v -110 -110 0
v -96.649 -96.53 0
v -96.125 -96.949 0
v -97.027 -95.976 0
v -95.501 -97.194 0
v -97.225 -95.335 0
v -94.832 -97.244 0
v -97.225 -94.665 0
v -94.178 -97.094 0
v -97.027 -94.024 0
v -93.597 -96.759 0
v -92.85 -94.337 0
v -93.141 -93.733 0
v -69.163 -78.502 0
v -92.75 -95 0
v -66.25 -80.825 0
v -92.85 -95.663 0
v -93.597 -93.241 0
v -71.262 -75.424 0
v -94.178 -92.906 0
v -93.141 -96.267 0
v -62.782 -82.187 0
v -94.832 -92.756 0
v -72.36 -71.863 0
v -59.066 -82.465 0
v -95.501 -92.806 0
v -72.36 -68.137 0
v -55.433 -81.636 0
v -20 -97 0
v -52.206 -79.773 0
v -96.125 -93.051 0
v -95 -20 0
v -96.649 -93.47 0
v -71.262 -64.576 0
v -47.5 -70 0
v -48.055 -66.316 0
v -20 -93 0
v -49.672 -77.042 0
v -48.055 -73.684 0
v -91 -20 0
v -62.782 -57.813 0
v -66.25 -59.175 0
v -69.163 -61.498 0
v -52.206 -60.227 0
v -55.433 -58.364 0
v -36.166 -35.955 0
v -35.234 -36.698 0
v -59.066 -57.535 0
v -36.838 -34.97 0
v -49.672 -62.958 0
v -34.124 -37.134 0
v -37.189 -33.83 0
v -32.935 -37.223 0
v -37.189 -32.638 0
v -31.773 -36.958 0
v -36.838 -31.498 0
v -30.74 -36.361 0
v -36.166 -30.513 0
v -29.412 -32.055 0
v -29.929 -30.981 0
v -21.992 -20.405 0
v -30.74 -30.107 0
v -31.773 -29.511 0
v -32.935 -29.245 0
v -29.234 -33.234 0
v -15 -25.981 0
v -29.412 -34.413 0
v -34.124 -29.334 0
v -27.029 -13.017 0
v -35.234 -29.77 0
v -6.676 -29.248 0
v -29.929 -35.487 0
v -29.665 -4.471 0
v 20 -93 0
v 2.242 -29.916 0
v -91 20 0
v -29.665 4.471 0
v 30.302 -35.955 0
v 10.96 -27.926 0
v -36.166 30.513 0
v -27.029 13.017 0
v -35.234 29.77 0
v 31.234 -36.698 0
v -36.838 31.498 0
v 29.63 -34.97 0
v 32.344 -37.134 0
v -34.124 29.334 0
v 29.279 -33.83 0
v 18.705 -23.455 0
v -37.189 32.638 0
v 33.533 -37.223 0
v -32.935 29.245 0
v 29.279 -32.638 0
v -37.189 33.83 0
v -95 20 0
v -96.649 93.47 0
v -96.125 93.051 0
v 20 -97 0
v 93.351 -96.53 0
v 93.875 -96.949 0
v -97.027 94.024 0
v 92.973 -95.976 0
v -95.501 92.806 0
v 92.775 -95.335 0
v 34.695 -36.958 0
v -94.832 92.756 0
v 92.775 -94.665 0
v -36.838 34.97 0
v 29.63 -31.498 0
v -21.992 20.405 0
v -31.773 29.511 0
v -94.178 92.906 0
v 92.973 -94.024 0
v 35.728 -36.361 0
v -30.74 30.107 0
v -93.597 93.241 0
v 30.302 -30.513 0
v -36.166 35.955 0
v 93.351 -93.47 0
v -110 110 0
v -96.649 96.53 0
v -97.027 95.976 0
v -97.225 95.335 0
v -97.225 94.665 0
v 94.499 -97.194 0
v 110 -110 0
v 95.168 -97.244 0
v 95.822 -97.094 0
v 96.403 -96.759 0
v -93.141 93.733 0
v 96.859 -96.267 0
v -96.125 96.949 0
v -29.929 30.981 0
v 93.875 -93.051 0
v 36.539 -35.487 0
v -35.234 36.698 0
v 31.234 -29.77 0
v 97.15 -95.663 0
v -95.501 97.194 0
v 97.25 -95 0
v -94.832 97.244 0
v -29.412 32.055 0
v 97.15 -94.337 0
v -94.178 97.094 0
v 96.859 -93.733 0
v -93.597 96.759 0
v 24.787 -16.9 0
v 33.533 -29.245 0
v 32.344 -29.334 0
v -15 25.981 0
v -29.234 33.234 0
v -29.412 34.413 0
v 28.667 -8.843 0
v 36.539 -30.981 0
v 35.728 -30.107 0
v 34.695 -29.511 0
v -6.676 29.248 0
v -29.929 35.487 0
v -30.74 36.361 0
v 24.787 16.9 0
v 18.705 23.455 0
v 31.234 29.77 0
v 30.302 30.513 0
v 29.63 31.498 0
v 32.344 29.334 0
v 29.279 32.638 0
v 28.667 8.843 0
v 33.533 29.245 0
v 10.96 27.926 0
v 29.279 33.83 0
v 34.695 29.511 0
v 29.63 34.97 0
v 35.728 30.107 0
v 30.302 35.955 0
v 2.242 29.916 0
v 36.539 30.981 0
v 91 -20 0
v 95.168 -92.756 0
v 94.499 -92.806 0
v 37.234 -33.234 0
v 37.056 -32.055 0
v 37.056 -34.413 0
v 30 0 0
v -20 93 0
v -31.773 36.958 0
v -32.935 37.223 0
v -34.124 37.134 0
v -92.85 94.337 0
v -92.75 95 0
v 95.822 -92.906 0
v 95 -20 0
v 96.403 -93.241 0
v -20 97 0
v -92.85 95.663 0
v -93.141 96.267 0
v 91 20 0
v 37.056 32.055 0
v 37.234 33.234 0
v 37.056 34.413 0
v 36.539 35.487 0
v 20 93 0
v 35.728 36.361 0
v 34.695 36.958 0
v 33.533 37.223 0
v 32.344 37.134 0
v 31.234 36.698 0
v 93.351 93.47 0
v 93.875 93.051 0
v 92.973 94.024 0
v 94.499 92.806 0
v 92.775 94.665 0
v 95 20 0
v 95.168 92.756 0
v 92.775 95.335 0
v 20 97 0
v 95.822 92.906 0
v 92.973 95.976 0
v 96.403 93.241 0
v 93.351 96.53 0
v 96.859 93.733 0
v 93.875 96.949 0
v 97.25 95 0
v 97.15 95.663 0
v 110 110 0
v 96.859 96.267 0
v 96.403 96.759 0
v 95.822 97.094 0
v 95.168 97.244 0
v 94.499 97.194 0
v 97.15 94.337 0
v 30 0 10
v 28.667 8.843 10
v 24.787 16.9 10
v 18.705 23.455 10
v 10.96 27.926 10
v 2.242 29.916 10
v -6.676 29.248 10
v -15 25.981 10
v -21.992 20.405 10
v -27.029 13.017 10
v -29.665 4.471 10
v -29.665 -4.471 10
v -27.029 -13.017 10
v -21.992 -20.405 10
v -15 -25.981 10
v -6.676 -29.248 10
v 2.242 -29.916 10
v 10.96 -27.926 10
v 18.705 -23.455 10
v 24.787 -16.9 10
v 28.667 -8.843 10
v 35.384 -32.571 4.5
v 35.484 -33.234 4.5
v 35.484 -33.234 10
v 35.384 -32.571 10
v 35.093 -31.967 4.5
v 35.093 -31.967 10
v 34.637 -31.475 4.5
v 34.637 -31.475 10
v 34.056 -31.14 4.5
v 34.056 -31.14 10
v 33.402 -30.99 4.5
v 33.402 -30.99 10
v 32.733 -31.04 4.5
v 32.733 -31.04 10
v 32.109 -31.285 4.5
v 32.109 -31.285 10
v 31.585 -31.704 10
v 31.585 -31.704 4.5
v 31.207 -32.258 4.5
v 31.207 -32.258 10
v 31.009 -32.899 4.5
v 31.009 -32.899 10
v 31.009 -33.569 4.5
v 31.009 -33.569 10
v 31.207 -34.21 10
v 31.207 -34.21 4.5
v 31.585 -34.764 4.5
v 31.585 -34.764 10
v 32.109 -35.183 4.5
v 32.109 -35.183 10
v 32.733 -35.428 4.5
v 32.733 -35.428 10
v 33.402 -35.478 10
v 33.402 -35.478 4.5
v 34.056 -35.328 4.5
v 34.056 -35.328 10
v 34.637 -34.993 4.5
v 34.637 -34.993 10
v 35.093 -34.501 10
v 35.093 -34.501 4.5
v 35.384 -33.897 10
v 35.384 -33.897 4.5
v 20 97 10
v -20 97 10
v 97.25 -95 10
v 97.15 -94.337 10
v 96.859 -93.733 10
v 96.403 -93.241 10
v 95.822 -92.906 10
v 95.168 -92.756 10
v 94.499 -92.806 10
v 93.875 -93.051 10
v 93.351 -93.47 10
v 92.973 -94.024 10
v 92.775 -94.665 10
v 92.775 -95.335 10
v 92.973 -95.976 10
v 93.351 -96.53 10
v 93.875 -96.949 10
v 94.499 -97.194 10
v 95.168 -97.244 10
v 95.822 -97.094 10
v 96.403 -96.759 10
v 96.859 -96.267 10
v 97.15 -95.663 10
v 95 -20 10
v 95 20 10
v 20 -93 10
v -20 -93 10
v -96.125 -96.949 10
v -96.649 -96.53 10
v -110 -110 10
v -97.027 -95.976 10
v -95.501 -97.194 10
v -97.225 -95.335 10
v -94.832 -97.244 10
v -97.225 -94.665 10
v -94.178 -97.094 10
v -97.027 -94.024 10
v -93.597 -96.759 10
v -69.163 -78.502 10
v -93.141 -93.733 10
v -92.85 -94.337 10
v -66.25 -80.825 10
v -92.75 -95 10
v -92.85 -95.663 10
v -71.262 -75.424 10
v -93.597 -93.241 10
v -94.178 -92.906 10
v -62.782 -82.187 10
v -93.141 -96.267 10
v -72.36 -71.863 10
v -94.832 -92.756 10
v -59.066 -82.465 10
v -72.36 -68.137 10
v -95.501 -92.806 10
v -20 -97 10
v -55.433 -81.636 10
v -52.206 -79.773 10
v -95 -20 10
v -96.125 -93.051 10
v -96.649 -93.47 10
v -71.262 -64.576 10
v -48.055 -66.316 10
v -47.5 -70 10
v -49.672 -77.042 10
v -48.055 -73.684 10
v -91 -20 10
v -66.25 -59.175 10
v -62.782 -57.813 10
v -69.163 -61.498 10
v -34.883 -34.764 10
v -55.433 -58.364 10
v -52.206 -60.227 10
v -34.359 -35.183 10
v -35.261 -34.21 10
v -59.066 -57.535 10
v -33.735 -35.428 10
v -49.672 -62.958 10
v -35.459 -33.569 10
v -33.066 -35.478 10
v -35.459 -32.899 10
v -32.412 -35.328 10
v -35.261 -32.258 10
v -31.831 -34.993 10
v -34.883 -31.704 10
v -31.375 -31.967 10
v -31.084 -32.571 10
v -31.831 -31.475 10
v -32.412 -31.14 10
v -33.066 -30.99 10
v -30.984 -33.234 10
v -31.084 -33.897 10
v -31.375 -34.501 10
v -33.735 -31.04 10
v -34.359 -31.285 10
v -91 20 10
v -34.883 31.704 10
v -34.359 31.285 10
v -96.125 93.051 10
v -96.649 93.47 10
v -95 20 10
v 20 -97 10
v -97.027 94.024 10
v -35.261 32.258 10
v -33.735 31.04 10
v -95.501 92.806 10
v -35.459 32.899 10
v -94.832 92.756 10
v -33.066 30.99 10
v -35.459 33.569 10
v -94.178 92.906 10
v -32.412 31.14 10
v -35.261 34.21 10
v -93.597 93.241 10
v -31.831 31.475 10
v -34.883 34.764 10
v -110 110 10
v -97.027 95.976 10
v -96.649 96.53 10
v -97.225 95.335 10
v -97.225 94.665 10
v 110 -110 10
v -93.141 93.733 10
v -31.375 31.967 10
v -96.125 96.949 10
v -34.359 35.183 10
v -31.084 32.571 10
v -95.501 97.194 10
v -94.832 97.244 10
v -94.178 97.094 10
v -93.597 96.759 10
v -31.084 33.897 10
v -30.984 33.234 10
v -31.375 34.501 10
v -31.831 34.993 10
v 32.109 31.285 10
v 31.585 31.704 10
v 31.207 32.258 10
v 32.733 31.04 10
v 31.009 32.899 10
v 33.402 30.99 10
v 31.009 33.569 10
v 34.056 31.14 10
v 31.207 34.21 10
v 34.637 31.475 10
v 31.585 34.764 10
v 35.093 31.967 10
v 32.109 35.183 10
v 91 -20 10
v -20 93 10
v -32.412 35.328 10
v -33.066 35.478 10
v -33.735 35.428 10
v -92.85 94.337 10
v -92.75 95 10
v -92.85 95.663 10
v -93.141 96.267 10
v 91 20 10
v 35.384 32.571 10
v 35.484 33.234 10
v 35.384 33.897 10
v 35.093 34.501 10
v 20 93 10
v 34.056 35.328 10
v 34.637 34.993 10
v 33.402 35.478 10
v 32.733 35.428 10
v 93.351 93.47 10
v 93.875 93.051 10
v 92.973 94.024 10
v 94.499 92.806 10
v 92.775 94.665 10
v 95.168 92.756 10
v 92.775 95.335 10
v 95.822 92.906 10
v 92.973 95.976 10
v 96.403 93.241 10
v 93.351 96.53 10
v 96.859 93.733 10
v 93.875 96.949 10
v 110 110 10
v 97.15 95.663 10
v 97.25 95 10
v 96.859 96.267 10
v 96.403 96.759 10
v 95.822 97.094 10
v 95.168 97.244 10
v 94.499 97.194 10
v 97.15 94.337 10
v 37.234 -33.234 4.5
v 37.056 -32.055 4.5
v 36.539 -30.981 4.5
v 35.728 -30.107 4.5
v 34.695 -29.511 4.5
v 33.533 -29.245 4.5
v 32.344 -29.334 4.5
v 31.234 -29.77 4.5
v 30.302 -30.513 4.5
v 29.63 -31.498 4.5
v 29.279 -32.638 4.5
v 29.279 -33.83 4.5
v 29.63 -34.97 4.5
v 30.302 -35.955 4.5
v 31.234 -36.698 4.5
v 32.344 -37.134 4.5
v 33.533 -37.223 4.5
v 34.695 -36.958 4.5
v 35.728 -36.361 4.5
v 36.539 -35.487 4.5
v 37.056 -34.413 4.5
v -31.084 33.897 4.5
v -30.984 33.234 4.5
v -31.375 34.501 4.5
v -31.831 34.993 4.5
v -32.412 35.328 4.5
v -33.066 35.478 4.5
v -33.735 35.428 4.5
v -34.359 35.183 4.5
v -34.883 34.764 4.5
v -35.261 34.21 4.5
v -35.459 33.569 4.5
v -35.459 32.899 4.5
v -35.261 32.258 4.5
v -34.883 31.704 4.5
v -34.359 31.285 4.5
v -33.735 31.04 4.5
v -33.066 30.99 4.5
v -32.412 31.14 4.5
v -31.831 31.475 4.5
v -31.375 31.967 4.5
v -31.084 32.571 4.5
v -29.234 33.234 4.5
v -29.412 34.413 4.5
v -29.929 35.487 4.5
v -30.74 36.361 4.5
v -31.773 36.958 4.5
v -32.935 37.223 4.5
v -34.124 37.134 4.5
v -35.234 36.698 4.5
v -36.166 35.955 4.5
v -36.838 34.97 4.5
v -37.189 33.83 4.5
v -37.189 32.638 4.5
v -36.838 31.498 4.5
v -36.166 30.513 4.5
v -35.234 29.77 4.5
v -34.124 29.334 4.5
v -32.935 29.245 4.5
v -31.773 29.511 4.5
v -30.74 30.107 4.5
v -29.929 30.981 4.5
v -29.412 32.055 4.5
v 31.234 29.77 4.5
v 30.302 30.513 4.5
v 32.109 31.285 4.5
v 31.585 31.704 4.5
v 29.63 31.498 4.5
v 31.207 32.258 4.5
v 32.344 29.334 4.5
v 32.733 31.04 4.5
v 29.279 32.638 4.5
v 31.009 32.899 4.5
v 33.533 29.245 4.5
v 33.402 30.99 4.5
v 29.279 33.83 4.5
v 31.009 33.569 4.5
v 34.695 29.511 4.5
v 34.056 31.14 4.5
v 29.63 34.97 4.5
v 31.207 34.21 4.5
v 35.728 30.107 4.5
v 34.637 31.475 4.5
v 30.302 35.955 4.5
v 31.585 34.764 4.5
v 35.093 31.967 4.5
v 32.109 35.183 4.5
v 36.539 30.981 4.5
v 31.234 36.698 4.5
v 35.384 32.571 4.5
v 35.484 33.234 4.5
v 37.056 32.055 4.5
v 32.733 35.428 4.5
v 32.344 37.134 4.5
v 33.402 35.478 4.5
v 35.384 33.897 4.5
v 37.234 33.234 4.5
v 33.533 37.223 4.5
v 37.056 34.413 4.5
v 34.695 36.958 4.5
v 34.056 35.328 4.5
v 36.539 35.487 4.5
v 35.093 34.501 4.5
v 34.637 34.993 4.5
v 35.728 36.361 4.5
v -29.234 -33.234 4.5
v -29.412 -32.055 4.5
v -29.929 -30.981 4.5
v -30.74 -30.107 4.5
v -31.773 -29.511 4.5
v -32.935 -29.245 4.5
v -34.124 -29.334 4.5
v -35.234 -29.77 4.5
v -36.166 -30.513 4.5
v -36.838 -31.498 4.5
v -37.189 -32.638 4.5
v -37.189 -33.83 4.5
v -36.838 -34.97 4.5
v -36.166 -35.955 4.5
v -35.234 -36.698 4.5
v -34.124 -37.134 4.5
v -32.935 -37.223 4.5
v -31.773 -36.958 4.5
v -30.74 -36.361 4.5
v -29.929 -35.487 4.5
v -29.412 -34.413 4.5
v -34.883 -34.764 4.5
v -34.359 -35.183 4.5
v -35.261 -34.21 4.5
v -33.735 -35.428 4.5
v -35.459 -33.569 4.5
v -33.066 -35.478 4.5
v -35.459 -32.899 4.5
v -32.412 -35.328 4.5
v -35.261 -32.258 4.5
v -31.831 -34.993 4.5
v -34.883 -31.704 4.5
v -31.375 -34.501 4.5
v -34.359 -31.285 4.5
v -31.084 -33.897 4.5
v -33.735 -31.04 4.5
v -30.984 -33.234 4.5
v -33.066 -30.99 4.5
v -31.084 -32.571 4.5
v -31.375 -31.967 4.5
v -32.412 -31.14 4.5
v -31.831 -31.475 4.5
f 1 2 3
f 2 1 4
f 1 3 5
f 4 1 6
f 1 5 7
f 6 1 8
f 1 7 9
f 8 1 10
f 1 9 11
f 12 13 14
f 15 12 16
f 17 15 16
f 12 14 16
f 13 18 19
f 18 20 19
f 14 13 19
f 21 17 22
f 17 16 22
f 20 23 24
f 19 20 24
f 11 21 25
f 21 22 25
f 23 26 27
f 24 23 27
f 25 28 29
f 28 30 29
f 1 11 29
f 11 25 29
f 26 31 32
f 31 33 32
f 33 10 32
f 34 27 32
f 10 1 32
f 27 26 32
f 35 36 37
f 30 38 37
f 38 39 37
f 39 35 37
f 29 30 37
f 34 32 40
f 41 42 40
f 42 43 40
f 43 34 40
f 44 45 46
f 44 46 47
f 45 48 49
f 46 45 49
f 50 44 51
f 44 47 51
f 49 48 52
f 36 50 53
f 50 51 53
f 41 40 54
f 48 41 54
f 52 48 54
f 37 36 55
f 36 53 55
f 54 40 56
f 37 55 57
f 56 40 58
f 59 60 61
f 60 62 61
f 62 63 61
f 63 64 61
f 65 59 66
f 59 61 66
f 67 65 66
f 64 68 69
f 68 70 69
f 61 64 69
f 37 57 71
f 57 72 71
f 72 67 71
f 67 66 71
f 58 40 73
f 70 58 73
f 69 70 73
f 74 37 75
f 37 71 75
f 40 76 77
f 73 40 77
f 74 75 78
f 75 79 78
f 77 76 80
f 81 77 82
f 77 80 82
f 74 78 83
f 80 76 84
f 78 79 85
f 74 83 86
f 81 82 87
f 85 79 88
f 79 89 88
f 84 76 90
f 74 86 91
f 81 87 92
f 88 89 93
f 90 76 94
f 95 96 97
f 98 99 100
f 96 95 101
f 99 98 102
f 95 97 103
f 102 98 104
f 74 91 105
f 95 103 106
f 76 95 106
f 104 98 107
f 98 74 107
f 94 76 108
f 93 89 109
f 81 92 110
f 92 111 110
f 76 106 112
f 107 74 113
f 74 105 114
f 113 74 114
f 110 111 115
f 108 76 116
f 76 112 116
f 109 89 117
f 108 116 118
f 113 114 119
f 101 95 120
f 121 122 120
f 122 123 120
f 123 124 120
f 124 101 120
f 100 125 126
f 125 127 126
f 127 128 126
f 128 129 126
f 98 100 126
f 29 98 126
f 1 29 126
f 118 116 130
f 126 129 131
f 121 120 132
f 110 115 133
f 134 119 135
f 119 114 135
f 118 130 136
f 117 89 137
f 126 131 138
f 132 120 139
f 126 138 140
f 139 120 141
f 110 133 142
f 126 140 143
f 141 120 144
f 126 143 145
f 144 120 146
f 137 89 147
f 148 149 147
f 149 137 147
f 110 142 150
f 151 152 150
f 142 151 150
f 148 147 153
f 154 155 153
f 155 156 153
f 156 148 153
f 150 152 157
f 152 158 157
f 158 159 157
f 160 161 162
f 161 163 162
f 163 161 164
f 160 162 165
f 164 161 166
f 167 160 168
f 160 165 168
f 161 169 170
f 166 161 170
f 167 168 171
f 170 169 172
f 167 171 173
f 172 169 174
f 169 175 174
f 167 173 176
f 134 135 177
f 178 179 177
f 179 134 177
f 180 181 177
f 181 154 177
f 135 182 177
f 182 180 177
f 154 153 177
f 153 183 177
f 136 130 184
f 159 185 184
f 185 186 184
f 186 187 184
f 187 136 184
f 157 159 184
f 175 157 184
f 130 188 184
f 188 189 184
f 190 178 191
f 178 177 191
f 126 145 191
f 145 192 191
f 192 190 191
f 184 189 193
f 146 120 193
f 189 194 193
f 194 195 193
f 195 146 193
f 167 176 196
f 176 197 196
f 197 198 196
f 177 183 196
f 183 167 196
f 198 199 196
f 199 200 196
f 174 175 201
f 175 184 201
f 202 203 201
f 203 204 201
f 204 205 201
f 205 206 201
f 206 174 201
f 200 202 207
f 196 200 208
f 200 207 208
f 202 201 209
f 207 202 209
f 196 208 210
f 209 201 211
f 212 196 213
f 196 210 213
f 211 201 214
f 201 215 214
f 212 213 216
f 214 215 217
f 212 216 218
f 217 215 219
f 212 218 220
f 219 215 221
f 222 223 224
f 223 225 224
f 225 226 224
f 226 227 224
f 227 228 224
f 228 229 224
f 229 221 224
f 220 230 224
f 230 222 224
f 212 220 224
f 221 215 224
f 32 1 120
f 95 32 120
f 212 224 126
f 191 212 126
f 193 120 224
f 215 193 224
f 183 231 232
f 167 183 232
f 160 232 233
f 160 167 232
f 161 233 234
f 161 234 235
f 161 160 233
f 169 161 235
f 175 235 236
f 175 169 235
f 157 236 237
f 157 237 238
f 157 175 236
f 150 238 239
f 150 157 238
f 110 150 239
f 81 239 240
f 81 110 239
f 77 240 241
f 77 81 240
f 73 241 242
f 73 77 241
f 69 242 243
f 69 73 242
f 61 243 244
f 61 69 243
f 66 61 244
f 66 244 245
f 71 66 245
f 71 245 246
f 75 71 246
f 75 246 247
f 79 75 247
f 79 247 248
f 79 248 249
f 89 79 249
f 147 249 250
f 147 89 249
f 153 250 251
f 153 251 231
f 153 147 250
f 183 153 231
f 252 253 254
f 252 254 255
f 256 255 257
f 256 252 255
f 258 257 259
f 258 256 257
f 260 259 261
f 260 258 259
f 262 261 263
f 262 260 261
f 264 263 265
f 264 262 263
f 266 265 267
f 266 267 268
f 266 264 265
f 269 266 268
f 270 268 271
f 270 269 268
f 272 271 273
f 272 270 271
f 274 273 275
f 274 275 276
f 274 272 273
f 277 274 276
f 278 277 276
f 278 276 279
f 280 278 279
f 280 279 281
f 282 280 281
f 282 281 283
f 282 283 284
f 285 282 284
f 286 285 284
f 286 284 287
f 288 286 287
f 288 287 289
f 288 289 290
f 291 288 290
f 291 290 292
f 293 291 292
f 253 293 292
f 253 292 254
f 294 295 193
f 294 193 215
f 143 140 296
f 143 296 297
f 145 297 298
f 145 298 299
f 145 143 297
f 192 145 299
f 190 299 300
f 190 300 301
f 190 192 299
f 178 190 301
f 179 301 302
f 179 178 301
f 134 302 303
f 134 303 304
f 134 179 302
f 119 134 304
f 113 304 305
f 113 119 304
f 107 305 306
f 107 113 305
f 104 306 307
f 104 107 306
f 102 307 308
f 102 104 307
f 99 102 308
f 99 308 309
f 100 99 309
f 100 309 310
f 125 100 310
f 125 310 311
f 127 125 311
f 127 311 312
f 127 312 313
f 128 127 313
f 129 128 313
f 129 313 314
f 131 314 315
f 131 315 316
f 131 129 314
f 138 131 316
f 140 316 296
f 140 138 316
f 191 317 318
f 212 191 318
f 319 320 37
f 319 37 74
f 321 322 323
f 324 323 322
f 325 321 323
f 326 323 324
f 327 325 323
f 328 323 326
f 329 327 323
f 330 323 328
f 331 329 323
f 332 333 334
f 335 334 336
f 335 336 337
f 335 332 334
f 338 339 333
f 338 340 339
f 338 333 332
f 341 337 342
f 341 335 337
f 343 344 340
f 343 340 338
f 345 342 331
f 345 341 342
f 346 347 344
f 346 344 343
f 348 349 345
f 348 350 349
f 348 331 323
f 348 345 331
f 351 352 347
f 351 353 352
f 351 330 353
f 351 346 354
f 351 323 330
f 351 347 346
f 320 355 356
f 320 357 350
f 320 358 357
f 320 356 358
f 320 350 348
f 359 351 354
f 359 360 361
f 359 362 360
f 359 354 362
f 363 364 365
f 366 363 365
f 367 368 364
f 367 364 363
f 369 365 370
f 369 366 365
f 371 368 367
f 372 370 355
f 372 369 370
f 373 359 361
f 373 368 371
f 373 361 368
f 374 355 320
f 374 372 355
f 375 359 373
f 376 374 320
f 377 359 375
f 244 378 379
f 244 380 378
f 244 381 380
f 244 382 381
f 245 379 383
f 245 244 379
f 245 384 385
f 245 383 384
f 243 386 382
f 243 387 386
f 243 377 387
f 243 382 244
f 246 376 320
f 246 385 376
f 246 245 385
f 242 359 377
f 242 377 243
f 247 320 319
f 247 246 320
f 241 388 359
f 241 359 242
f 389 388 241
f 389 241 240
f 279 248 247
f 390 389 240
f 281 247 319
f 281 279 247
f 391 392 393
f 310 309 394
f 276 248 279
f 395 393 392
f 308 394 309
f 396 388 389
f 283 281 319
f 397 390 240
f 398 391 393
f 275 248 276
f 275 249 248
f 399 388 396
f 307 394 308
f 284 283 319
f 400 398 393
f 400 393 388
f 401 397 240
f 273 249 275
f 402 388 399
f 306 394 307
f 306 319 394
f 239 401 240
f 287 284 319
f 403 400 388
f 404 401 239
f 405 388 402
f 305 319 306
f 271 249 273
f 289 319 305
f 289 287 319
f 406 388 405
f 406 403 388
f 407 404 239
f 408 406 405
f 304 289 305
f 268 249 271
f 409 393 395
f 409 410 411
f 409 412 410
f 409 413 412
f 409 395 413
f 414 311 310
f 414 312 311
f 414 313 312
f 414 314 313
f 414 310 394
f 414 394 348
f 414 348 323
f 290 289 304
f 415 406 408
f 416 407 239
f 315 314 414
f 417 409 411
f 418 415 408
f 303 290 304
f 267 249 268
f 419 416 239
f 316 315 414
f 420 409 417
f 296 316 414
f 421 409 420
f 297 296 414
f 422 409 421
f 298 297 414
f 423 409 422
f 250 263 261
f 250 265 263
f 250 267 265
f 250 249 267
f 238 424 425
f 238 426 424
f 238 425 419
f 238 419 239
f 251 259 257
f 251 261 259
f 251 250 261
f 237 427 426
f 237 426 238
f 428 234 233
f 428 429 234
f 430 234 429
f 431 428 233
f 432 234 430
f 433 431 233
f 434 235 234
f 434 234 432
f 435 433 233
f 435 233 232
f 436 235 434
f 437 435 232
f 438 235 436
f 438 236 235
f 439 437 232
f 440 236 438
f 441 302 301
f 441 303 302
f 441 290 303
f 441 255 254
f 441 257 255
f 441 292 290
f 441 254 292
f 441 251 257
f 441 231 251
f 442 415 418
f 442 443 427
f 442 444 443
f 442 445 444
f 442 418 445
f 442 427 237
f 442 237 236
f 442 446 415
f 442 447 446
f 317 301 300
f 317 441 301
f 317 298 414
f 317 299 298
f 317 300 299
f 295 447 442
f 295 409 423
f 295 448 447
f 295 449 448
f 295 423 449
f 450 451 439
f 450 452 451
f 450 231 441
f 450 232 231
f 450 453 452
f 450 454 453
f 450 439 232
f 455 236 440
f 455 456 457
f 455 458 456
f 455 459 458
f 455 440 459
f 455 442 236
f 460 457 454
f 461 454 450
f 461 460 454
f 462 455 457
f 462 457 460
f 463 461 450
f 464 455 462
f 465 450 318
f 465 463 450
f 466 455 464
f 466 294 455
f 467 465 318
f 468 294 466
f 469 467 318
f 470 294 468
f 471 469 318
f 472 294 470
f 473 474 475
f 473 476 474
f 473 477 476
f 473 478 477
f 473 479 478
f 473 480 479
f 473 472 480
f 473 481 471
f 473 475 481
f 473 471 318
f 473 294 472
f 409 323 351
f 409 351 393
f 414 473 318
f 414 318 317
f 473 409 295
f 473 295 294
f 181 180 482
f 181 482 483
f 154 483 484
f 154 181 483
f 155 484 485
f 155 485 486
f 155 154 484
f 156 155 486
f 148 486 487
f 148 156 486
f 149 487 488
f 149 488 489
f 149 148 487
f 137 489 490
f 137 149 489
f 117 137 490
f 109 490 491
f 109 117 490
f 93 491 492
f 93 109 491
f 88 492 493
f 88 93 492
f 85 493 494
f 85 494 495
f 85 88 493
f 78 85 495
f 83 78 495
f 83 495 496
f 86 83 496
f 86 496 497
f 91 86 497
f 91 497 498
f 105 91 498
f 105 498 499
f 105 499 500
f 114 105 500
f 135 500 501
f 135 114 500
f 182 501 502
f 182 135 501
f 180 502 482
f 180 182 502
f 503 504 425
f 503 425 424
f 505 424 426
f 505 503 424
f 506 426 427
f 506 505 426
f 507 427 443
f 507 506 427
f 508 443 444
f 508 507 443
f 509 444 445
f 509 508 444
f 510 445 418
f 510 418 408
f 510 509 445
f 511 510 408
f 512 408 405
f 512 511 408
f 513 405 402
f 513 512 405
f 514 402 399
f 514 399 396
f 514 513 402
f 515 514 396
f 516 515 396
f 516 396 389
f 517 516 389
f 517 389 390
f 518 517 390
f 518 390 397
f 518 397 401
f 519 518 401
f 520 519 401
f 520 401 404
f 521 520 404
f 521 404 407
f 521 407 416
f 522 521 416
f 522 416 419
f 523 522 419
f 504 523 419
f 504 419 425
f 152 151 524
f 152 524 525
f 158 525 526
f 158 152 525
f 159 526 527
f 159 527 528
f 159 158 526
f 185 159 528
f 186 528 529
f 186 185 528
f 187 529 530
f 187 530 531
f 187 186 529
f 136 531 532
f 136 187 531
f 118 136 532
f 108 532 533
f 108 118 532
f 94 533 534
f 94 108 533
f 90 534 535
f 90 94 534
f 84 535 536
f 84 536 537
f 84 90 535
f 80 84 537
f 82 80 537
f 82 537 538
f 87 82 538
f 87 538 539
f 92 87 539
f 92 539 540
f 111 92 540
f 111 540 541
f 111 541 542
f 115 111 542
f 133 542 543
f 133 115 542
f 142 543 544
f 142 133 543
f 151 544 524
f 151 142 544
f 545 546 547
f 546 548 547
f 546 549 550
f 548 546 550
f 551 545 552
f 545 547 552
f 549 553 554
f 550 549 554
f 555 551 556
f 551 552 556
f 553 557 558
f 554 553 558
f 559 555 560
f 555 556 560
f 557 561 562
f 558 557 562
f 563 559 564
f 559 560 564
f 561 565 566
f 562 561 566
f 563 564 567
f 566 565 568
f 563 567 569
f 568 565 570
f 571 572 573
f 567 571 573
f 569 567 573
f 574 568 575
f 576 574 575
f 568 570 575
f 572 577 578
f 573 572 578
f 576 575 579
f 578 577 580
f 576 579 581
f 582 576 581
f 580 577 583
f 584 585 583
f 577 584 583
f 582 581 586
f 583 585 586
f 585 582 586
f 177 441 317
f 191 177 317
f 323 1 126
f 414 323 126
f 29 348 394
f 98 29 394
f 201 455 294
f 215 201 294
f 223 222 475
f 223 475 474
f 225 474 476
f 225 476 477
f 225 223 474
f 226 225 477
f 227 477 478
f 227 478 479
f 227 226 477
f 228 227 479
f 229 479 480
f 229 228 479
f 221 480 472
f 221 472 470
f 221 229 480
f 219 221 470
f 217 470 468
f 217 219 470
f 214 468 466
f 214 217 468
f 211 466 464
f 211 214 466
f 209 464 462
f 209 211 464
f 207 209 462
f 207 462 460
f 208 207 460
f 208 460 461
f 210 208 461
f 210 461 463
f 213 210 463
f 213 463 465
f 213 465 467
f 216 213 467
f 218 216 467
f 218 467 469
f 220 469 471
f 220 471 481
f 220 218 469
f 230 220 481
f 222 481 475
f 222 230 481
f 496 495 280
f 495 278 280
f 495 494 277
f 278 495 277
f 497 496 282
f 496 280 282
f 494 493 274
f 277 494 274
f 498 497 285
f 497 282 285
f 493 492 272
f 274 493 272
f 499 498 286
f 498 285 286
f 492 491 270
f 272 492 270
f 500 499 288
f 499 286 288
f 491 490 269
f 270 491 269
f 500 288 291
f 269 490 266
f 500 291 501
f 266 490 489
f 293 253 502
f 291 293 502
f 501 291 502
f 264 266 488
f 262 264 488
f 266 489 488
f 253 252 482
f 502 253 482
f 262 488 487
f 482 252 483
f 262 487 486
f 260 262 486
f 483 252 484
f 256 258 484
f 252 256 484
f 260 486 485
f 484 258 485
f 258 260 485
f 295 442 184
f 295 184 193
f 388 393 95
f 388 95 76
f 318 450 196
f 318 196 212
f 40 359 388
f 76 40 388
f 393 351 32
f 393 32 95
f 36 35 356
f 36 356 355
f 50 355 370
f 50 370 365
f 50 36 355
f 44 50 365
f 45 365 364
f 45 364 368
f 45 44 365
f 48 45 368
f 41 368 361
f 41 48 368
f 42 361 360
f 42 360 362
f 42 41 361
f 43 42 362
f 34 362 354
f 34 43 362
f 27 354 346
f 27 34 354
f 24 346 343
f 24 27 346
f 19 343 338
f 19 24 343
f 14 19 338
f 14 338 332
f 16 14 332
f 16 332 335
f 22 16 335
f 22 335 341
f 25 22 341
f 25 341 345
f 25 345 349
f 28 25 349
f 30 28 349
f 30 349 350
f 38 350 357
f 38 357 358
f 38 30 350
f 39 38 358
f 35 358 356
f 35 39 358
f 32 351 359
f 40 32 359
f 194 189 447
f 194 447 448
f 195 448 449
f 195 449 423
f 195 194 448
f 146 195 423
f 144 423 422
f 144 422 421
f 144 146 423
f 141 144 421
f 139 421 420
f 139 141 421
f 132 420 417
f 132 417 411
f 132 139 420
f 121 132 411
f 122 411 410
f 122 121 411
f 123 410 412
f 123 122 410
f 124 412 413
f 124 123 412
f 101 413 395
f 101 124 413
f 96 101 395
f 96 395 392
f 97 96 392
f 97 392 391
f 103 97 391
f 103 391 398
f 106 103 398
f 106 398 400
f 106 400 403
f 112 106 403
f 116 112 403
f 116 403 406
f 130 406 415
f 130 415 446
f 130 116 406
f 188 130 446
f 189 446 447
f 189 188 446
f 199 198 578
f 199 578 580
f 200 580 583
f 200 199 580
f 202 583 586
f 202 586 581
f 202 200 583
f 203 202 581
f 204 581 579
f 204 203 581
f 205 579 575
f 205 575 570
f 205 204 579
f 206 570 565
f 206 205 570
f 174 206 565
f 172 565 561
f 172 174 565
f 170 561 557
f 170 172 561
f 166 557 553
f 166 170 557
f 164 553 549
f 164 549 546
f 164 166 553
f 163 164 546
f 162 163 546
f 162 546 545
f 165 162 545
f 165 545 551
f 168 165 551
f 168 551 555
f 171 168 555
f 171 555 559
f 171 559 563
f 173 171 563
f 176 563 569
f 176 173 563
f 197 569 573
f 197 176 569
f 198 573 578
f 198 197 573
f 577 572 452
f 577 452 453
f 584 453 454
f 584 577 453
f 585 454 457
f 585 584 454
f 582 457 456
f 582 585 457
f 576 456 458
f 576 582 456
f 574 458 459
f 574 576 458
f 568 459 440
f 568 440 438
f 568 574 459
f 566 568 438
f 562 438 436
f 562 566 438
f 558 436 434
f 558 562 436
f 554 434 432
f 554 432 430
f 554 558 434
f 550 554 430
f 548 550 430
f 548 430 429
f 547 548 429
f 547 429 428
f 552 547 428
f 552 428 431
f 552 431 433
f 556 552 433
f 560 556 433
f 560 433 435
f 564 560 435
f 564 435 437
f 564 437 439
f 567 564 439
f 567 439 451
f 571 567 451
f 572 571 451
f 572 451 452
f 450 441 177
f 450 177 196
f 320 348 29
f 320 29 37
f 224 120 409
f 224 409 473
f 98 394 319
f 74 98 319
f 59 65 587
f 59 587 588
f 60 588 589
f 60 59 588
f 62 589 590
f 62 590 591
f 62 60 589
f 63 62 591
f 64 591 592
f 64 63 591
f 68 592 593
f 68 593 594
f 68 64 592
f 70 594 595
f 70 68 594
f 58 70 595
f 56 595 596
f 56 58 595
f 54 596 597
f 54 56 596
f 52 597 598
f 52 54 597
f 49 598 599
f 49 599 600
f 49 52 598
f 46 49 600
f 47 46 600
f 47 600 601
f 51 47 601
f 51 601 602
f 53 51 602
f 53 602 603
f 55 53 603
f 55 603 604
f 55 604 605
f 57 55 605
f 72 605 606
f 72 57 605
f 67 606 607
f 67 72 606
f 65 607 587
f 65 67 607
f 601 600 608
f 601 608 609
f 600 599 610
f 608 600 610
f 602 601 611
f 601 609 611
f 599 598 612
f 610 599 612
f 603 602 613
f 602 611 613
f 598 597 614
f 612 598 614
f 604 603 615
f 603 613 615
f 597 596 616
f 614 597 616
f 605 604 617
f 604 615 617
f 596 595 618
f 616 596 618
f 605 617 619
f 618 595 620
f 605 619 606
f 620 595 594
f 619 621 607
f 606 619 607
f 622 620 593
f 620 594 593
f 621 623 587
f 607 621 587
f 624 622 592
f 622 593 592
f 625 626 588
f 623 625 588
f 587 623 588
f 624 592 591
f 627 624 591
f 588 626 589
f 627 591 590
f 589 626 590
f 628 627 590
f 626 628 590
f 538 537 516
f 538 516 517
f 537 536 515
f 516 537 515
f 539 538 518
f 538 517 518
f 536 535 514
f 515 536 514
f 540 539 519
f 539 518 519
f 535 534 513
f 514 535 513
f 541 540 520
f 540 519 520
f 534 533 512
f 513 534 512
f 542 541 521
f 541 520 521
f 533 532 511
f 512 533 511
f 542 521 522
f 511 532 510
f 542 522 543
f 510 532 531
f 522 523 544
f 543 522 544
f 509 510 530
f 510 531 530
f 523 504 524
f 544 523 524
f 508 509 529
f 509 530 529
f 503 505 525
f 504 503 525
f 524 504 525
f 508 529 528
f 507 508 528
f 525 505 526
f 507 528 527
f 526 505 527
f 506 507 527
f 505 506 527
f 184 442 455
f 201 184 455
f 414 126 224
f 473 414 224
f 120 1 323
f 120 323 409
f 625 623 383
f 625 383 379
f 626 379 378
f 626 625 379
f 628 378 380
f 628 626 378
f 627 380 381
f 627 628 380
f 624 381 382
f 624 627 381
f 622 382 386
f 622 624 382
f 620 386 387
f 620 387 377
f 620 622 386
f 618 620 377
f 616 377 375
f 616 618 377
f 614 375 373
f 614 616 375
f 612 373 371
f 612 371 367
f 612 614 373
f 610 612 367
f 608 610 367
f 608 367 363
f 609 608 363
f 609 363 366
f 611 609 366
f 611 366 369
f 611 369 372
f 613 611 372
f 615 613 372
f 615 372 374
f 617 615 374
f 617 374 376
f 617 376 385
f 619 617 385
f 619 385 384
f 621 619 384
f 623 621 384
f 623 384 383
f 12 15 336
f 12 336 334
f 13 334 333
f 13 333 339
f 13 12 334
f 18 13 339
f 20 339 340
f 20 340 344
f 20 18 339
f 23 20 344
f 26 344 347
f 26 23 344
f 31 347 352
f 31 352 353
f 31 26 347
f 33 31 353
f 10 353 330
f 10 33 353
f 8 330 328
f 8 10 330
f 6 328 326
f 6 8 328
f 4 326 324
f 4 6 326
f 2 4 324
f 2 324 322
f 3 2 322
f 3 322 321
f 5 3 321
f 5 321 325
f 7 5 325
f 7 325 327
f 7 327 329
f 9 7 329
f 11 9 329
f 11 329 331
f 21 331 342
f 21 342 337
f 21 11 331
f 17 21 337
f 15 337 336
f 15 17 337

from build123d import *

# Parameters (mm, degrees)
SK_PLACA_W                         = 220
SK_PLACA_H                         = 220
PLACA_DEPTH                        = 10
SK_PASO_CABLES_R                   = 30
PASO_CABLES_DEPTH                  = 10
SK_PASANTES_M4_PEDESTAL_R          = 2.25
PASANTES_M4_PEDESTAL_DEPTH         = 10
SK_CAJAS_M4_INFERIORES_R           = 4
CAJAS_M4_INFERIORES_DEPTH          = 4.5
SK_PASANTES_M4_SEPARADORES_CAJA_R  = 2.25
PASANTES_M4_SEPARADORES_CAJA_DEPTH = 10
SK_PASO_CABLES_CAJA_R              = 12.5
PASO_CABLES_CAJA_DEPTH             = 10
CROQUIS1_W                         = 40
CROQUIS1_H                         = 4
CROQUIS1_W_2                       = 4
CROQUIS1_H_2                       = 40
CORTAR_EXTRUIR1_DEPTH              = 156.884572681


with BuildPart() as part:
    # Sk_Placa → Placa (new body)
    with BuildSketch(Plane.XY):
        Rectangle(SK_PLACA_W, SK_PLACA_H)
    extrude(amount=PLACA_DEPTH)

    # Sk_Paso_cables → Paso_cables (cut)
    with BuildSketch(Plane.XY):
        Circle(SK_PASO_CABLES_R)
    extrude(amount=PASO_CABLES_DEPTH, mode=Mode.SUBTRACT)

    # Sk_Pasantes_M4_pedestal → Pasantes_M4_pedestal (cut)
    with BuildSketch(Plane.XY):
        with Locations((33.234018716, 33.234018716)):
            Circle(SK_PASANTES_M4_PEDESTAL_R)
        with Locations((-33.234018716, 33.234018716)):
            Circle(SK_PASANTES_M4_PEDESTAL_R)
        with Locations((-33.234018716, -33.234018716)):
            Circle(SK_PASANTES_M4_PEDESTAL_R)
        with Locations((33.234018716, -33.234018716)):
            Circle(SK_PASANTES_M4_PEDESTAL_R)
    extrude(amount=PASANTES_M4_PEDESTAL_DEPTH, mode=Mode.SUBTRACT)

    # Sk_Cajas_M4_inferiores → Cajas_M4_inferiores (cut)
    with BuildSketch(Plane.XY):
        with Locations((33.234018716, 33.234018716)):
            Circle(SK_CAJAS_M4_INFERIORES_R)
        with Locations((-33.234018716, 33.234018716)):
            Circle(SK_CAJAS_M4_INFERIORES_R)
        with Locations((-33.234018716, -33.234018716)):
            Circle(SK_CAJAS_M4_INFERIORES_R)
        with Locations((33.234018716, -33.234018716)):
            Circle(SK_CAJAS_M4_INFERIORES_R)
    extrude(amount=CAJAS_M4_INFERIORES_DEPTH, mode=Mode.SUBTRACT)

    # Sk_Pasantes_M4_separadores_caja → Pasantes_M4_separadores_caja (cut)
    with BuildSketch(Plane.XY):
        with Locations((-95, -95)):
            Circle(SK_PASANTES_M4_SEPARADORES_CAJA_R)
        with Locations((-95, 95)):
            Circle(SK_PASANTES_M4_SEPARADORES_CAJA_R)
        with Locations((95, -95)):
            Circle(SK_PASANTES_M4_SEPARADORES_CAJA_R)
        with Locations((95, 95)):
            Circle(SK_PASANTES_M4_SEPARADORES_CAJA_R)
    extrude(amount=PASANTES_M4_SEPARADORES_CAJA_DEPTH, mode=Mode.SUBTRACT)

    # Sk_Paso_cables_caja → Paso_cables_caja (cut)
    with BuildSketch(Plane.XY):
        with Locations((-60, -70)):
            Circle(SK_PASO_CABLES_CAJA_R)
    extrude(amount=PASO_CABLES_CAJA_DEPTH, mode=Mode.SUBTRACT)

    # Croquis1 → Cortar-Extruir1 (cut, through all)
    with BuildSketch(Plane.XY.offset(10)):
        with Locations((0, -95)):
            Rectangle(CROQUIS1_W, CROQUIS1_H)
        with Locations((0, 95)):
            Rectangle(CROQUIS1_W, CROQUIS1_H)
        with Locations((93, 0)):
            Rectangle(CROQUIS1_W_2, CROQUIS1_H_2)
        with Locations((-93, 0)):
            Rectangle(CROQUIS1_W_2, CROQUIS1_H_2)
    extrude(amount=-CORTAR_EXTRUIR1_DEPTH, mode=Mode.SUBTRACT)


solid = part.part
